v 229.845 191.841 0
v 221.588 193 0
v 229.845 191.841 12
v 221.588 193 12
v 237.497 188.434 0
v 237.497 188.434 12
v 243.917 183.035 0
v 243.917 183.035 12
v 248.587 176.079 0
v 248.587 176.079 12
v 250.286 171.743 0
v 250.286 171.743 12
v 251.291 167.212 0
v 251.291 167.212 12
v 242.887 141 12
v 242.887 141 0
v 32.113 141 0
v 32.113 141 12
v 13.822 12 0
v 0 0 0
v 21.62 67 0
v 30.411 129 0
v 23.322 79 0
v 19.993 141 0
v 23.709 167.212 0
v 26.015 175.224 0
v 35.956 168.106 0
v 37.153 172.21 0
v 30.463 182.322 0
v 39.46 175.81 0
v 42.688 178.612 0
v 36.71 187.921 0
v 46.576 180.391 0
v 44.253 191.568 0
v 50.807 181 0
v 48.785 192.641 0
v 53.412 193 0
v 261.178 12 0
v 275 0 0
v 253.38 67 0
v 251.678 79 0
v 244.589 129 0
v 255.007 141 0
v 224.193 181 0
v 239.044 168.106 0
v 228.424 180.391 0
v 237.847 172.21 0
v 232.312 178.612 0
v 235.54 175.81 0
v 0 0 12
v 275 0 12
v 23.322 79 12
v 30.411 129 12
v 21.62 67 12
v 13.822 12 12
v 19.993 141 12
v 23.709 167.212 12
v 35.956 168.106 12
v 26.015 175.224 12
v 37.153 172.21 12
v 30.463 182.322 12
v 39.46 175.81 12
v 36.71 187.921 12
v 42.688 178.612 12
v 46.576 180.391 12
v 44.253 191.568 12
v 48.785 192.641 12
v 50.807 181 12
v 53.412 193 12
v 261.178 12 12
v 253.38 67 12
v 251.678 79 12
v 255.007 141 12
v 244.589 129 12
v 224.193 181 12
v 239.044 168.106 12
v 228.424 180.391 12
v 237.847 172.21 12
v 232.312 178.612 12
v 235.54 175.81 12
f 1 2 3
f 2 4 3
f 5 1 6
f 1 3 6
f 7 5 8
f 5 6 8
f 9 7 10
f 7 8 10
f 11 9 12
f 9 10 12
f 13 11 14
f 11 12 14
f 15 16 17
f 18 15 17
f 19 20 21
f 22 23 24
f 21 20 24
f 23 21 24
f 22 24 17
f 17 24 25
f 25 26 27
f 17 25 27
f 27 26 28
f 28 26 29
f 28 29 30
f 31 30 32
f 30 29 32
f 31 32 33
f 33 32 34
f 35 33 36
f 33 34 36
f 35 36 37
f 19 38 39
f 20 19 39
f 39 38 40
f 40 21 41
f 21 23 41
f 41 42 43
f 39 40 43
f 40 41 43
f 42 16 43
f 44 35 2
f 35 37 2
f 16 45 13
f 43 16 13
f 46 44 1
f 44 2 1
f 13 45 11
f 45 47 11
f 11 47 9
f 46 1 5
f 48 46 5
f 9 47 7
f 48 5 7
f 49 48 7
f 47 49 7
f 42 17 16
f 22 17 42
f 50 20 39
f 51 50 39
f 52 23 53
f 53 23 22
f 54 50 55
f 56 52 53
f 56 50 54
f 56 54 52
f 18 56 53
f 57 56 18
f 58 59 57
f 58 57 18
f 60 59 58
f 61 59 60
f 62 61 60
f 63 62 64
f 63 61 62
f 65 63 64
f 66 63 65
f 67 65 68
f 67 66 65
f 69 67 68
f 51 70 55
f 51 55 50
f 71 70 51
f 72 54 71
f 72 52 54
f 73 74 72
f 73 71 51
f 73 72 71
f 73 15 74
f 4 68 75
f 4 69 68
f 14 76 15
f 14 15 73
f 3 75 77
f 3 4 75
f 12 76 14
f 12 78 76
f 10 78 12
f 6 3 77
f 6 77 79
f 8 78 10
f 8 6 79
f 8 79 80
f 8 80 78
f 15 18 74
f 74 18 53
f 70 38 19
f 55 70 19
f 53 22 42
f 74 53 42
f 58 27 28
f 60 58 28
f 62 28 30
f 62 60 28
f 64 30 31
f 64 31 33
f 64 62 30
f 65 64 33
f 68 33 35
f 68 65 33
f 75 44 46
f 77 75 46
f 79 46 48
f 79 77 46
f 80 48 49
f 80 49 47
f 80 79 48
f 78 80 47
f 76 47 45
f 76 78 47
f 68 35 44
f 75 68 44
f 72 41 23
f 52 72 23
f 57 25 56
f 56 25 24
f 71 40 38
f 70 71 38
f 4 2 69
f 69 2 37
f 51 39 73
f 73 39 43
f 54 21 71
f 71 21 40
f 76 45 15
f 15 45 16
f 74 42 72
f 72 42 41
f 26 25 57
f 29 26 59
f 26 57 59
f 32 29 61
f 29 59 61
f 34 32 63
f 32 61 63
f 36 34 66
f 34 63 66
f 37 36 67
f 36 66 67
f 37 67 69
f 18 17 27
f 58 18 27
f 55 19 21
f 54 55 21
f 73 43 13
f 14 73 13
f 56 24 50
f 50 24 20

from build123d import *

# Parameters (mm, degrees)
F1_DEPTH = 12
F2_R     = 30
F3_R     = 15


with BuildPart() as f1:
    # F0 (on Top) → F1 (new body)
    with BuildSketch(Plane.XY):
        Polygon((39.4856995648, 193), (37.7842070275, 181), (137.5, 181), (237.2157929725, 181), (235.5143004352, 193), (137.5, 193), align=None)
        Polygon((27.3656716418, 193), (25.6641791045, 181), (37.7842070275, 181), (39.4856995648, 193), align=None)
        Polygon((25.6641791045, 181), (19.9925373134, 141), (32.1125652364, 141), (37.7842070275, 181), align=None)
        Polygon((19.9925373134, 141), (18.2910447761, 129), (30.4110726991, 129), (32.1125652364, 141), align=None)
        Polygon((237.2157929725, 181), (242.8874347636, 141), (255.0074626866, 141), (249.3358208955, 181), align=None)
        Polygon((235.5143004352, 193), (237.2157929725, 181), (249.3358208955, 181), (247.6343283582, 193), align=None)
        Polygon((242.8874347636, 141), (244.5889273009, 129), (256.7089552239, 129), (255.0074626866, 141), align=None)
        Polygon((244.5889273009, 129), (251.6784795397, 79), (263.7985074627, 79), (256.7089552239, 129), align=None)
        Polygon((251.6784795397, 79), (253.379972077, 67), (265.5, 67), (263.7985074627, 79), align=None)
        Polygon((23.3215204603, 79), (21.620027923, 67), (137.5, 67), (253.379972077, 67), (251.6784795397, 79), (137.5, 79), align=None)
        Polygon((253.379972077, 67), (261.1784795397, 12), (273.2985074627, 12), (265.5, 67), align=None)
        Polygon((261.1784795397, 12), (262.879972077, 0), (275, 0), (273.2985074627, 12), align=None)
        Polygon((13.8215204603, 12), (12.120027923, 0), (262.879972077, 0), (261.1784795397, 12), (137.5, 12), align=None)
        Polygon((1.7014925373, 12), (0, 0), (12.120027923, 0), (13.8215204603, 12), align=None)
        Polygon((9.5, 67), (1.7014925373, 12), (13.8215204603, 12), (21.620027923, 67), align=None)
        Polygon((11.2014925373, 79), (9.5, 67), (21.620027923, 67), (23.3215204603, 79), align=None)
        Polygon((18.2910447761, 129), (11.2014925373, 79), (23.3215204603, 79), (30.4110726991, 129), align=None)
        Polygon((32.1125652364, 141), (30.4110726991, 129), (137.5, 129), (244.5889273009, 129), (242.8874347636, 141), (137.5, 141), align=None)
    extrude(amount=F1_DEPTH)

    # F2
    f2_edges = [f1.edges().sort_by_distance(p)[0] for p in [
        (27.365672, 193, 6),
        (247.634328, 193, 6),
    ]]
    fillet(f2_edges, radius=F2_R)

    # F3
    f3_edges = [f1.edges().sort_by_distance(p)[0] for p in [
        (37.784207, 181, 6),
        (237.215793, 181, 6),
    ]]
    fillet(f3_edges, radius=F3_R)


solid = f1.part
